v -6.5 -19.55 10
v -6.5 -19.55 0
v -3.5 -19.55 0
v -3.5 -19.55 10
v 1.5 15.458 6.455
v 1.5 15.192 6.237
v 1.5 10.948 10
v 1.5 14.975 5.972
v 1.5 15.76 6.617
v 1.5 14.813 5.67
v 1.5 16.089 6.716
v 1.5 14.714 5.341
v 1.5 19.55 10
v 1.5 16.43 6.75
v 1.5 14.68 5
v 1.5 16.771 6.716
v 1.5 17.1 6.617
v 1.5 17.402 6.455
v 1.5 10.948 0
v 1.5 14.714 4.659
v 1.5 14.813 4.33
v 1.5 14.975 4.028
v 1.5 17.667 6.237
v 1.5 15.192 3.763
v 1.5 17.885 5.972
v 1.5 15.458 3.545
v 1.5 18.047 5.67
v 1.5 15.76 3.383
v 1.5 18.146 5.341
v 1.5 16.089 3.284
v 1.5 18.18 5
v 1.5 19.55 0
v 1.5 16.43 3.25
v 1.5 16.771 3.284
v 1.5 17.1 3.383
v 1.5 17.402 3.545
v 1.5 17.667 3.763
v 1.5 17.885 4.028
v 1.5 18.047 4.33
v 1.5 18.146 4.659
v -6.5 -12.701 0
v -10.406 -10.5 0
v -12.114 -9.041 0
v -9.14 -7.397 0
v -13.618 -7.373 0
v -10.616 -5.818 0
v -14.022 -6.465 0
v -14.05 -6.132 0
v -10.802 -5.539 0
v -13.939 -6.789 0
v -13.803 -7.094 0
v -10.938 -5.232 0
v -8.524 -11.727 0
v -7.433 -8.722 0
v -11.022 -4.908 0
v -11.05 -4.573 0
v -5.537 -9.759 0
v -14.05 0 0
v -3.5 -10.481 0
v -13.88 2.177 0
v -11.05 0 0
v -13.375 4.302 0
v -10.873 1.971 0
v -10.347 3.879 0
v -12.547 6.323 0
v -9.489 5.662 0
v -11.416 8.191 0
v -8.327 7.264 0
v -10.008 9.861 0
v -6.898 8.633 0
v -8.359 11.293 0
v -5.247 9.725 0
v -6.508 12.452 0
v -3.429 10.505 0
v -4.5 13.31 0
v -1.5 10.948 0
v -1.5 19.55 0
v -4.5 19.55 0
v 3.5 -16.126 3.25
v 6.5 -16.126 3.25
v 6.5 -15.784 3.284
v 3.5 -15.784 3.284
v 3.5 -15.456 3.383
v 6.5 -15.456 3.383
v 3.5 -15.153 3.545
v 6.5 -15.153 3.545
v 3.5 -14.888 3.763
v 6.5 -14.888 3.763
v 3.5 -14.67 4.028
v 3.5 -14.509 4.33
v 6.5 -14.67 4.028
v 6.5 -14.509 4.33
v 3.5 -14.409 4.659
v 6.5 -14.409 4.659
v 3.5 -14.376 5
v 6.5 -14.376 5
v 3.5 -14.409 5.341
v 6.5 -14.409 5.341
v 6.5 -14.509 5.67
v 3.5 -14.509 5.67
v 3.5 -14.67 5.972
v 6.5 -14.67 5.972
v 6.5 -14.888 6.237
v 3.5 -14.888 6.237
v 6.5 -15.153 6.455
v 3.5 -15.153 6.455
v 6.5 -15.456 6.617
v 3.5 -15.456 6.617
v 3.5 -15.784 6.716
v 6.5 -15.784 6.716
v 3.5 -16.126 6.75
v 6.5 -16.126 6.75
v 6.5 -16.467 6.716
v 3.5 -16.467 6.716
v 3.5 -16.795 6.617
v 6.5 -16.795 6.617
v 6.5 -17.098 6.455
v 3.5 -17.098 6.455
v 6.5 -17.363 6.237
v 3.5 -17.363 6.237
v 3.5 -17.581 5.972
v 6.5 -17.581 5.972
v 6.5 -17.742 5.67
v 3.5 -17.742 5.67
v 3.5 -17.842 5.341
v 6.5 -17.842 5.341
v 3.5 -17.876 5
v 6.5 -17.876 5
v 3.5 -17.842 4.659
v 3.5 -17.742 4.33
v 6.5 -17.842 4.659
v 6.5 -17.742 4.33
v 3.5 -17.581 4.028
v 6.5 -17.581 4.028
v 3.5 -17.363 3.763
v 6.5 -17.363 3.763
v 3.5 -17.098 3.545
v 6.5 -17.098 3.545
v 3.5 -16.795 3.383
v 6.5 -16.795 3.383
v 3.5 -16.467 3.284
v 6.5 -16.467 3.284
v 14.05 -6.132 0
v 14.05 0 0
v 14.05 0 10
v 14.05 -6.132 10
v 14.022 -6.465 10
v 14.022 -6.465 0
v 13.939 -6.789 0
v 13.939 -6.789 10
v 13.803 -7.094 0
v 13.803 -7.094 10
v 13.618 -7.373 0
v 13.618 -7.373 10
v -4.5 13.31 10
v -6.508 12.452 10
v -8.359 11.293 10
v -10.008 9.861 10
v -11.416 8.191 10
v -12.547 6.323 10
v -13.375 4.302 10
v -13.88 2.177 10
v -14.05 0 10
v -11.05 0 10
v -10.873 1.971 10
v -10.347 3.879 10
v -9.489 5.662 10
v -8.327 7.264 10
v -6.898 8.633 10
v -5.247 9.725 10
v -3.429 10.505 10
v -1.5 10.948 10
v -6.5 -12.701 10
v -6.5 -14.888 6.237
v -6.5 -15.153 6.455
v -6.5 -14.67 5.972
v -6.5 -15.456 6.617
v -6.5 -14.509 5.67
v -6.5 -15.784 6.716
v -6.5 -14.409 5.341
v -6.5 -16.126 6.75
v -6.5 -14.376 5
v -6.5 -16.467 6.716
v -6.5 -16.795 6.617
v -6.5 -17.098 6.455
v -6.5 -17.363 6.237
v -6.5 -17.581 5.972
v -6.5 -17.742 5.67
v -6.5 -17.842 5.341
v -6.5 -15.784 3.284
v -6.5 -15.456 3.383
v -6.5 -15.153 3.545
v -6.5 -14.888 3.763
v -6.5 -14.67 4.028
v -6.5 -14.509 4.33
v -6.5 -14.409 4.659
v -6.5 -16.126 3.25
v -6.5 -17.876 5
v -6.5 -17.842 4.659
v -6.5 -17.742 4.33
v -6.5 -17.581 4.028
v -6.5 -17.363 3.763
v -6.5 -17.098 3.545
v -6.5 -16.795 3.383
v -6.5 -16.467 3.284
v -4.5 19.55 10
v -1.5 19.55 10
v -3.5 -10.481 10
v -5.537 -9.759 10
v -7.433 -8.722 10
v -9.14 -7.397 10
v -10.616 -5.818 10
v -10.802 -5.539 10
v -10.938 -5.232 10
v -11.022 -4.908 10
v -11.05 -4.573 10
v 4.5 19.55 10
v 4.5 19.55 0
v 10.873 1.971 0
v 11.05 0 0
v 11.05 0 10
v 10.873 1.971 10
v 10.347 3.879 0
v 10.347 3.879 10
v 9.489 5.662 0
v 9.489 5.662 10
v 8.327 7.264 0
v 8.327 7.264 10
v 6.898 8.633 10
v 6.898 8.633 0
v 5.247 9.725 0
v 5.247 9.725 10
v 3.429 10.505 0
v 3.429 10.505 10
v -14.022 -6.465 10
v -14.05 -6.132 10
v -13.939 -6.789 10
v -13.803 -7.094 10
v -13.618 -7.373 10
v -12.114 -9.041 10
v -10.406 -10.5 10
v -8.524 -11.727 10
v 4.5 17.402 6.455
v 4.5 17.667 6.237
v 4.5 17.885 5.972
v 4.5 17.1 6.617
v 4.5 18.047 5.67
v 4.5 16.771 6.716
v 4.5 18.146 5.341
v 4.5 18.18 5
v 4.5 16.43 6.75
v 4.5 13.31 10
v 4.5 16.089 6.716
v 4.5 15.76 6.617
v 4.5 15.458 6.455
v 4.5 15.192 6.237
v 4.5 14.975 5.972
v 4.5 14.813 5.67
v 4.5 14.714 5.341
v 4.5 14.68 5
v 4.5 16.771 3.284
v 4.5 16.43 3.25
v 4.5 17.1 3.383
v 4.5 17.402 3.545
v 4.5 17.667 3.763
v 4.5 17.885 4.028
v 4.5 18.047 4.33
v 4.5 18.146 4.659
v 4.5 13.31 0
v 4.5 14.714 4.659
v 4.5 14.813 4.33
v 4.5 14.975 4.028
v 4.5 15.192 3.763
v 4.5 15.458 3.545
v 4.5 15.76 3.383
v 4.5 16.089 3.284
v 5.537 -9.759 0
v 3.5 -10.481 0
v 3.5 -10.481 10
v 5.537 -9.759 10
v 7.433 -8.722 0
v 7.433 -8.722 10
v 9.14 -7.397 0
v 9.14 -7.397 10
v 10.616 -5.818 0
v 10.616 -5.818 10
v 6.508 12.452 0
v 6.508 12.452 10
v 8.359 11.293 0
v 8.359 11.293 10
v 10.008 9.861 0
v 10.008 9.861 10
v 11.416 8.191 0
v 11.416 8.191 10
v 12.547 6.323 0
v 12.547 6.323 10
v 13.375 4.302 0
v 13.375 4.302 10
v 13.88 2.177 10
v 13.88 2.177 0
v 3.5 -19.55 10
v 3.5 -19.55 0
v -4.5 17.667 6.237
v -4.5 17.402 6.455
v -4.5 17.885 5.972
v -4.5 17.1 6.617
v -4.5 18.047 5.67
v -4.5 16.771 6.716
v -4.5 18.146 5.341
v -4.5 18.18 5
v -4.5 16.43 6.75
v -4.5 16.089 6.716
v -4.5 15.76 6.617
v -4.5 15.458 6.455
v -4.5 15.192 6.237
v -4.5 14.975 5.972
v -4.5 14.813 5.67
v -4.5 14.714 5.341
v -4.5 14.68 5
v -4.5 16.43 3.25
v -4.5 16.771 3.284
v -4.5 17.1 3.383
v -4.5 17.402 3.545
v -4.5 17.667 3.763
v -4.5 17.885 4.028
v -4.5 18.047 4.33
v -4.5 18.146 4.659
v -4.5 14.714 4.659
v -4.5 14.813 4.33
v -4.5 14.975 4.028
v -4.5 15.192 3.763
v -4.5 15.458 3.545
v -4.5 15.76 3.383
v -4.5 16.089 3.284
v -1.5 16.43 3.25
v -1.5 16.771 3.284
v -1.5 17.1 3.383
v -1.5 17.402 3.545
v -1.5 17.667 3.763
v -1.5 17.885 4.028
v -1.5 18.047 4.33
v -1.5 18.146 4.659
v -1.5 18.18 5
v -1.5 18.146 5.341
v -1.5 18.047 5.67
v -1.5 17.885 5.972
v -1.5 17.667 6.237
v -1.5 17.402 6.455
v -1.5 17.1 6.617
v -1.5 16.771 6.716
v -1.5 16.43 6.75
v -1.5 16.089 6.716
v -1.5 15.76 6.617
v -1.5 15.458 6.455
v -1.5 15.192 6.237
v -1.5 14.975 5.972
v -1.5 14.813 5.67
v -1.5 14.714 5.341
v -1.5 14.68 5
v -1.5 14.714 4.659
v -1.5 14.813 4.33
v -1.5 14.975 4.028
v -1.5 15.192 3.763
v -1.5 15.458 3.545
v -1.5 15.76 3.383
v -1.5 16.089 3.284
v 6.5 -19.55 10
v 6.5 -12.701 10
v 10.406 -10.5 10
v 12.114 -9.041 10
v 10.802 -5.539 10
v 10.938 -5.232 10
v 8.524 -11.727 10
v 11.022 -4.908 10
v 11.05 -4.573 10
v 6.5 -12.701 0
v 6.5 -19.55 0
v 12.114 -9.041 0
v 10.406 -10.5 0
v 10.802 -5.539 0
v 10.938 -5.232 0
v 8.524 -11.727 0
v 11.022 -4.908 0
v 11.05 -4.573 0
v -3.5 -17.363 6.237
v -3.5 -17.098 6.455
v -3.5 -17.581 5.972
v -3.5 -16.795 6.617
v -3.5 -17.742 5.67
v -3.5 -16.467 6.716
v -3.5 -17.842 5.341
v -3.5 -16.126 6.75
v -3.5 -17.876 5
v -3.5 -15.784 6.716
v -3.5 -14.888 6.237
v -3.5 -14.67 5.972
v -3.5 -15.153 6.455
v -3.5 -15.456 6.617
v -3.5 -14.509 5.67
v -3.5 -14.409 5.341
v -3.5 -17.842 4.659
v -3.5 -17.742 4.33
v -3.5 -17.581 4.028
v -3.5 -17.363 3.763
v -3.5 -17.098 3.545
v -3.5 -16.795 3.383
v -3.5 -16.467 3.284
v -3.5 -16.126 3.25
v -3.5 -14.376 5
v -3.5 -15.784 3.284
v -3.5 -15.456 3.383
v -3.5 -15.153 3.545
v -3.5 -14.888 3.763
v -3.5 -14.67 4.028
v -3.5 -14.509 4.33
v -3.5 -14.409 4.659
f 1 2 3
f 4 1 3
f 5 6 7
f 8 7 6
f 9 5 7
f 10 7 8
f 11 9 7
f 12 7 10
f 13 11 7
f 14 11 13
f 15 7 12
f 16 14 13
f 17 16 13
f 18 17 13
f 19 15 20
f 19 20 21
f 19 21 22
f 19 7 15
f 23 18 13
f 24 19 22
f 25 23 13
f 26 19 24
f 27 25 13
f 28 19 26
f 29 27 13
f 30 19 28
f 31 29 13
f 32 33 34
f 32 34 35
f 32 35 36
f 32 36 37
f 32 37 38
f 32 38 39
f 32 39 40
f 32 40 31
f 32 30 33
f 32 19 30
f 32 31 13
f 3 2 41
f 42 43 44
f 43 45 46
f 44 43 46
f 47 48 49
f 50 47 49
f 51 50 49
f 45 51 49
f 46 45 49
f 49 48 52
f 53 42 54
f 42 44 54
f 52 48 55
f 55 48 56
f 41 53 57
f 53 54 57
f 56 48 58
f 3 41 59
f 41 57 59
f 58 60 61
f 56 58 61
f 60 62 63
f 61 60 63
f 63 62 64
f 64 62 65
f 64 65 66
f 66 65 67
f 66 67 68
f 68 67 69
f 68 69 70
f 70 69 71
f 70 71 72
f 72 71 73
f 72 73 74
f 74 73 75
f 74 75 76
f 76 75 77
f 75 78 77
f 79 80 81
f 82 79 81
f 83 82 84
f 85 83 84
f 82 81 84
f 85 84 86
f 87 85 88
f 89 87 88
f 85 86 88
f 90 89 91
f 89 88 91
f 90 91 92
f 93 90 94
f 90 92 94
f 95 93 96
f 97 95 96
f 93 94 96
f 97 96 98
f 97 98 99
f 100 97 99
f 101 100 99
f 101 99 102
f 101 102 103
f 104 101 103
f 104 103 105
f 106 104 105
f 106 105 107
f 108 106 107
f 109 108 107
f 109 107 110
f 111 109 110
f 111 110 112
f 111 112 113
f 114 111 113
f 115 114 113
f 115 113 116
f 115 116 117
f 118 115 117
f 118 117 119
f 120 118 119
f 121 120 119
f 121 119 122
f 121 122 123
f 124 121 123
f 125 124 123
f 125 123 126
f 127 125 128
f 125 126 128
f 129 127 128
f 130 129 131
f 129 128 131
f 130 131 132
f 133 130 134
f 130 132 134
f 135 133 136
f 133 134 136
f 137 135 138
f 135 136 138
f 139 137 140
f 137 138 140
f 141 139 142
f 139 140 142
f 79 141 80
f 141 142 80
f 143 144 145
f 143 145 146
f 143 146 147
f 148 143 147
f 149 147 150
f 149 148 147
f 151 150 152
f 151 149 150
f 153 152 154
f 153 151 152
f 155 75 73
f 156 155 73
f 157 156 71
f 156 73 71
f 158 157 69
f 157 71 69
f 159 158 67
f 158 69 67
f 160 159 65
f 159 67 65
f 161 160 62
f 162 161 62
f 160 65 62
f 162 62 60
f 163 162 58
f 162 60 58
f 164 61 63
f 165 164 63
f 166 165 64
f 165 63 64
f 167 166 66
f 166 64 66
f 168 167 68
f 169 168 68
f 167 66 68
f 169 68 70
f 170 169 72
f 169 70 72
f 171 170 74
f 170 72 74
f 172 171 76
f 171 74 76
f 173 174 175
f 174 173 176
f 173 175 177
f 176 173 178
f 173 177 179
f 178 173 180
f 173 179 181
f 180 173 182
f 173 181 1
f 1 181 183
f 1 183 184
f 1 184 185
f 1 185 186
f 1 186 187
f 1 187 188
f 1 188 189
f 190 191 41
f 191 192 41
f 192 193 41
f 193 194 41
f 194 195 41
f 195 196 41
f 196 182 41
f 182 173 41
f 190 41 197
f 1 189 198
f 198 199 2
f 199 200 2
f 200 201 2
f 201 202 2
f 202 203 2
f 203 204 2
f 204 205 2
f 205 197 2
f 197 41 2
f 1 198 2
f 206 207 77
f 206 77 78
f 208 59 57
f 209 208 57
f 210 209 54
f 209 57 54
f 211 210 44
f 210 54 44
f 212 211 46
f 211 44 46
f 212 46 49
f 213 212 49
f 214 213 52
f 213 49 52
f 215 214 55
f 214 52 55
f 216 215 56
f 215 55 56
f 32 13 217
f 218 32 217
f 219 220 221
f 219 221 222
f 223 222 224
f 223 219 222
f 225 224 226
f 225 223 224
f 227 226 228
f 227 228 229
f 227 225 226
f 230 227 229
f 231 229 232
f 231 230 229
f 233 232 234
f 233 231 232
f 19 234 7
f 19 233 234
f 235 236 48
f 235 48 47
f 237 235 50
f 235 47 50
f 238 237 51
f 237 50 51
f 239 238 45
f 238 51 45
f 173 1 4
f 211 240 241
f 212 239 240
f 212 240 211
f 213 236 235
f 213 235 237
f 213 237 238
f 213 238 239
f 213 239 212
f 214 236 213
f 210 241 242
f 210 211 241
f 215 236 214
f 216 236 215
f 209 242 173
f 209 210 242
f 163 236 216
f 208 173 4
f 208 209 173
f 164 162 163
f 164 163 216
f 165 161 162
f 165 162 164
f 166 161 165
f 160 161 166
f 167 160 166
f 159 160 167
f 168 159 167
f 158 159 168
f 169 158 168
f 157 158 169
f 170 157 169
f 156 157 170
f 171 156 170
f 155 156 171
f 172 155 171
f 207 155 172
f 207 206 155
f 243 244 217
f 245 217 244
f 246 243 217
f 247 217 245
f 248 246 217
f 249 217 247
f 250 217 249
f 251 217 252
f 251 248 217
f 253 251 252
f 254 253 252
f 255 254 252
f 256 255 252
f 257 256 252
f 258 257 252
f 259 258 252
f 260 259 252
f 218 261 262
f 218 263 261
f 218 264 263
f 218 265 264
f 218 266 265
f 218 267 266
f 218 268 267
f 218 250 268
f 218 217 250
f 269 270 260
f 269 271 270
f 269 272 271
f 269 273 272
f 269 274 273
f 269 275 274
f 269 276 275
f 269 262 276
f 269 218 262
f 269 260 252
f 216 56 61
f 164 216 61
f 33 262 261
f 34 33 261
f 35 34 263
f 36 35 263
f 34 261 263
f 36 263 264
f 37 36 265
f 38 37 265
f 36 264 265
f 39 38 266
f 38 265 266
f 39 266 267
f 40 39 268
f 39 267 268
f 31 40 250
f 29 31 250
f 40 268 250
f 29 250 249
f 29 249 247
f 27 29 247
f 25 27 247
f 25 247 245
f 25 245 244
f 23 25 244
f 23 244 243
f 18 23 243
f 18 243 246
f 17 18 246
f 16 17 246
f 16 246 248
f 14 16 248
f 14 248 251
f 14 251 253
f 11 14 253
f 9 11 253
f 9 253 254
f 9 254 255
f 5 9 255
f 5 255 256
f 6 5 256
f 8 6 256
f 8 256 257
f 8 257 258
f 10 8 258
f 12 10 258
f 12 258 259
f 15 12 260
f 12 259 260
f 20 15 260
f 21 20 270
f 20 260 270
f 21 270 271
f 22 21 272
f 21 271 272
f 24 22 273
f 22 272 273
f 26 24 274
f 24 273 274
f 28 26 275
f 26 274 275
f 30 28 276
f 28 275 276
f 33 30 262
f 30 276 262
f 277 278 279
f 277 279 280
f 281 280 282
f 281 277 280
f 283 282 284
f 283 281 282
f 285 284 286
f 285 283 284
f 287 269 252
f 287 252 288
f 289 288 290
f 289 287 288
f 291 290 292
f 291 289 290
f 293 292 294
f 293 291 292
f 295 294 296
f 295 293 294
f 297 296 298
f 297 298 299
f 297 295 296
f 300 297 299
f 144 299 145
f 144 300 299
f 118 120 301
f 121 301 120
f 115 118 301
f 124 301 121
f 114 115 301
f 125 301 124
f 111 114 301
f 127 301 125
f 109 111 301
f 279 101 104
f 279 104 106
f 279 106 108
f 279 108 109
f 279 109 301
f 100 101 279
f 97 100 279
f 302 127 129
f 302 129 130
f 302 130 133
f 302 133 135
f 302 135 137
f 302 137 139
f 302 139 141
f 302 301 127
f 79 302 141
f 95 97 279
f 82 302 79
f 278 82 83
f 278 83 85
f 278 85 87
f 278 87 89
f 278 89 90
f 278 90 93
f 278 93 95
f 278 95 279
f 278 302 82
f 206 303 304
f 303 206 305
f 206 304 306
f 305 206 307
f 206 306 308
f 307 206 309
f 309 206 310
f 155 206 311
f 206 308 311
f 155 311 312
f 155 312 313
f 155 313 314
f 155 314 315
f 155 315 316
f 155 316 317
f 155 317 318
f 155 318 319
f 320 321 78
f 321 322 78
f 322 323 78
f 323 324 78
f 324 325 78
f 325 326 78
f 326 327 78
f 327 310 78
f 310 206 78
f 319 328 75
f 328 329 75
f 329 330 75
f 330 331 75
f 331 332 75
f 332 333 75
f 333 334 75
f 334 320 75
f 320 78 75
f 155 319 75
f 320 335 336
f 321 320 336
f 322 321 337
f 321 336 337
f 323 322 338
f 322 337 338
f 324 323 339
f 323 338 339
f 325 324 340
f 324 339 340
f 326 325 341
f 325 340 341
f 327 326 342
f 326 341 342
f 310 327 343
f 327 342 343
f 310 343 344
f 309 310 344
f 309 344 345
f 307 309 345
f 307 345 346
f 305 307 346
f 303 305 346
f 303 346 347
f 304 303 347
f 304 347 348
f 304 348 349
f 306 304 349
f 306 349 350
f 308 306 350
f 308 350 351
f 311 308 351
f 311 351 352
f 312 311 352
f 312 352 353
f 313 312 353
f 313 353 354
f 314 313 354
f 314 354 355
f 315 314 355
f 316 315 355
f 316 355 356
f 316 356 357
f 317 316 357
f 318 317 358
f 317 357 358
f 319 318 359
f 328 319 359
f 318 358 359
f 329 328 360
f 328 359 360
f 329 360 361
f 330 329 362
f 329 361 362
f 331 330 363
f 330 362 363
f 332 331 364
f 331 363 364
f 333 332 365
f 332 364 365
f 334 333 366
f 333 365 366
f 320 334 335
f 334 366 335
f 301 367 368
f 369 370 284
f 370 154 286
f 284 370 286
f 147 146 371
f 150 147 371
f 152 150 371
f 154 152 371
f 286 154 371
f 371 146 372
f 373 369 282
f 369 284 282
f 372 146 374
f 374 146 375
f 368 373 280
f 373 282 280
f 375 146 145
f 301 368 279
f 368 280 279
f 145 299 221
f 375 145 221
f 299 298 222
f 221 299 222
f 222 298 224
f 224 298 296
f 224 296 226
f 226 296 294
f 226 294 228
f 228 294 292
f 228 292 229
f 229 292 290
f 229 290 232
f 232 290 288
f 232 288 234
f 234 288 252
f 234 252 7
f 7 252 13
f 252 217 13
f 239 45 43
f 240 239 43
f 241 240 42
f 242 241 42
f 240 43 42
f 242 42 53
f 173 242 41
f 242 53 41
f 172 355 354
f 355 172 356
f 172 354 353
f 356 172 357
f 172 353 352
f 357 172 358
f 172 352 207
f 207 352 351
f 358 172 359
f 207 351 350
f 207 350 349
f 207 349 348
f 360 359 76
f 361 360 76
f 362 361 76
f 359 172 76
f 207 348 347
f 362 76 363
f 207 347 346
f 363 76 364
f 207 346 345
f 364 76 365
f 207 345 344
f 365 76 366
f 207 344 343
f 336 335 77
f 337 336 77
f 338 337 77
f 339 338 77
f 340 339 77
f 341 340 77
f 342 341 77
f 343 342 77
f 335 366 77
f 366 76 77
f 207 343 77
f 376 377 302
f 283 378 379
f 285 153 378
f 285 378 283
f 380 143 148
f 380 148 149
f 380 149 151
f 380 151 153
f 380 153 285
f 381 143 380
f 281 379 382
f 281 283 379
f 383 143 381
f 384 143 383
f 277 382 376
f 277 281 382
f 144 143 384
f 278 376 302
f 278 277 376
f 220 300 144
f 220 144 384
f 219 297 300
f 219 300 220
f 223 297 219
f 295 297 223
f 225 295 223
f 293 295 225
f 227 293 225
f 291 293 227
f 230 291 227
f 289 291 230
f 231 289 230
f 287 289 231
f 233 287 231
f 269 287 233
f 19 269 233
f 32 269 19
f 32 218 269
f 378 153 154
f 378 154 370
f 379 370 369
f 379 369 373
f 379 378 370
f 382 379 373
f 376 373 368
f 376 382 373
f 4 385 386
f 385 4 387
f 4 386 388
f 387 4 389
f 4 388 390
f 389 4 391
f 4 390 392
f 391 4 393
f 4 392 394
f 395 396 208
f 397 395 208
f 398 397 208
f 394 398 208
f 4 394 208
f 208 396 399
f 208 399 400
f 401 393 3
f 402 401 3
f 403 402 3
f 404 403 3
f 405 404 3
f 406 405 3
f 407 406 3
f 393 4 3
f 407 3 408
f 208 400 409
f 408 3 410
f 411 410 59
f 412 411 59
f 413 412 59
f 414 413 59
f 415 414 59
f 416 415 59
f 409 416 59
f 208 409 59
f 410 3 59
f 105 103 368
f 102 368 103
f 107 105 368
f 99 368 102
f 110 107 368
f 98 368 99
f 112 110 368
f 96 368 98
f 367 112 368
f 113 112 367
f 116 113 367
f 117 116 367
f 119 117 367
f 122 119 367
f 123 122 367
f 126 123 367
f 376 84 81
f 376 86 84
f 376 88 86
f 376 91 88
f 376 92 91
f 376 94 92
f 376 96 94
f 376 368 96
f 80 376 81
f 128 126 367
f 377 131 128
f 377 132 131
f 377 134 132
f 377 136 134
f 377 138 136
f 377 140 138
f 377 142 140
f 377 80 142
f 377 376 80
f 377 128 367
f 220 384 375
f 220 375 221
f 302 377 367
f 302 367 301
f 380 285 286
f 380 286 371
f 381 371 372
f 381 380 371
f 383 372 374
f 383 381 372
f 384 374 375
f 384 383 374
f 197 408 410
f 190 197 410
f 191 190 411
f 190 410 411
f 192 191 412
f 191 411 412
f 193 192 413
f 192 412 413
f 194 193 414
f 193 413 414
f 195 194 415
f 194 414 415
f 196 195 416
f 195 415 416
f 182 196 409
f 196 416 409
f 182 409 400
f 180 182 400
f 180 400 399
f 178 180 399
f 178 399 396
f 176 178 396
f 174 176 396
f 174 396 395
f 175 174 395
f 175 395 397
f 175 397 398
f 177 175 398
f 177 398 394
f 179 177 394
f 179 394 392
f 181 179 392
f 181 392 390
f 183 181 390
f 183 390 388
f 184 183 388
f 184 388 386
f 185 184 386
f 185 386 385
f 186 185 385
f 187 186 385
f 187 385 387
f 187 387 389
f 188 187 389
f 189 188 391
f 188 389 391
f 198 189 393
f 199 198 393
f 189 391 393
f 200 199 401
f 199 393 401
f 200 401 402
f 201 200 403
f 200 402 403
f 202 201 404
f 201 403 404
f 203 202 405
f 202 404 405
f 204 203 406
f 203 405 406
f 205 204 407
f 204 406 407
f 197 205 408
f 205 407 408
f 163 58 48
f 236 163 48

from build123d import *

# Parameters (mm, degrees)
BOSS_EXTRUDE1_DEPTH   = 10
BOSS_EXTRUDE1_2_DEPTH = 10
SKETCH3_R             = 1.75
CUT_EXTRUDE1_DEPTH    = 9
SKETCH2_R             = 1.75
CUT_EXTRUDE2_DEPTH    = 13


with BuildPart() as part:
    # Sketch1 → Boss-Extrude1 (new body)
    with BuildSketch(Plane.XY):
        with BuildLine():
            Line((-3.5, -19.55), (-3.5, -13.607075365))
            Line((-3.5, -13.607075365), (-3.5, -10.481054336))
            ThreePointArc((-3.5, -10.481054336), (-7.432970717, -8.721935391), (-10.615639418, -5.817907487))
            ThreePointArc((-10.615639418, -5.817907487), (-10.938290078, -5.232470693), (-11.05, -4.573410314))
            Line((-11.05, -4.573410314), (-11.05, 0))
            ThreePointArc((-11.05, 0), (-8.326989252, 7.263866051), (-1.5, 10.947716657))
            Line((-1.5, 10.947716657), (-1.5, 19.55))
            Line((-1.5, 19.55), (-4.5, 19.55))
            Line((-4.5, 19.55), (-4.5, 13.309864763))
            ThreePointArc((-4.5, 13.309864763), (-11.415504807, 8.190772247), (-14.05, 0))
            Line((-14.05, 0), (-14.05, -6.13172008))
            ThreePointArc((-14.05, -6.13172008), (-13.939041457, -6.788623705), (-13.618477627, -7.372638261))
            ThreePointArc((-13.618477627, -7.372638261), (-10.406069333, -10.500191535), (-6.5, -12.701050206))
            Line((-6.5, -12.701050206), (-6.5, -19.55))
            Line((-6.5, -19.55), (-3.5, -19.55))
        make_face()
    extrude(amount=BOSS_EXTRUDE1_DEPTH)


with BuildPart() as body_2:
    # Sketch1 → Boss-Extrude1 2 (new body)
    with BuildSketch(Plane.XY):
        with BuildLine():
            Line((3.5, -19.55), (3.5, -13.607075365))
            Line((3.5, -13.607075365), (3.5, -10.481054336))
            ThreePointArc((3.5, -10.481054336), (7.432970717, -8.721935391), (10.615639418, -5.817907487))
            ThreePointArc((10.615639418, -5.817907487), (10.938290078, -5.232470693), (11.05, -4.573410314))
            Line((11.05, -4.573410314), (11.05, 0))
            ThreePointArc((11.05, 0), (8.326989252, 7.263866051), (1.5, 10.947716657))
            Line((1.5, 10.947716657), (1.5, 19.55))
            Line((1.5, 19.55), (4.5, 19.55))
            Line((4.5, 19.55), (4.5, 13.309864763))
            ThreePointArc((4.5, 13.309864763), (11.415504807, 8.190772247), (14.05, 0))
            Line((14.05, 0), (14.05, -6.13172008))
            ThreePointArc((14.05, -6.13172008), (13.939041457, -6.788623705), (13.618477627, -7.372638261))
            ThreePointArc((13.618477627, -7.372638261), (10.406069333, -10.500191535), (6.5, -12.701050206))
            Line((6.5, -12.701050206), (6.5, -19.55))
            Line((6.5, -19.55), (3.5, -19.55))
        make_face()
    extrude(amount=BOSS_EXTRUDE1_2_DEPTH)


with BuildPart() as cut_extrude1_tool:
    # Sketch3 → Cut-Extrude1 (new body)
    with BuildSketch(Plane(origin=(4.5, 0, 0), x_dir=(0, 0, -1), z_dir=(1, 0, 0))):
        with Locations((-5, 16.429932381)):
            Circle(SKETCH3_R)
    extrude(amount=-CUT_EXTRUDE1_DEPTH)


with BuildPart() as part_1:
    add(part.part)

    # Cut-Extrude1: cut by cut_extrude1_tool
    add(cut_extrude1_tool.part, mode=Mode.SUBTRACT)


with BuildPart() as body_2_1:
    add(body_2.part)

    # Cut-Extrude1: cut by cut_extrude1_tool
    add(cut_extrude1_tool.part, mode=Mode.SUBTRACT)


with BuildPart() as cut_extrude2_tool:
    # Sketch2 → Cut-Extrude2 (new body)
    with BuildSketch(Plane(origin=(6.5, 0, 0), x_dir=(0, 0, -1), z_dir=(1, 0, 0))):
        with Locations((-5, -16.125525103)):
            Circle(SKETCH2_R)
    extrude(amount=-CUT_EXTRUDE2_DEPTH)


with BuildPart() as part_2:
    add(part_1.part)

    # Cut-Extrude2: cut by cut_extrude2_tool
    add(cut_extrude2_tool.part, mode=Mode.SUBTRACT)


with BuildPart() as body_2_2:
    add(body_2_1.part)

    # Cut-Extrude2: cut by cut_extrude2_tool
    add(cut_extrude2_tool.part, mode=Mode.SUBTRACT)


solid = Compound([part_2.part, body_2_2.part])
